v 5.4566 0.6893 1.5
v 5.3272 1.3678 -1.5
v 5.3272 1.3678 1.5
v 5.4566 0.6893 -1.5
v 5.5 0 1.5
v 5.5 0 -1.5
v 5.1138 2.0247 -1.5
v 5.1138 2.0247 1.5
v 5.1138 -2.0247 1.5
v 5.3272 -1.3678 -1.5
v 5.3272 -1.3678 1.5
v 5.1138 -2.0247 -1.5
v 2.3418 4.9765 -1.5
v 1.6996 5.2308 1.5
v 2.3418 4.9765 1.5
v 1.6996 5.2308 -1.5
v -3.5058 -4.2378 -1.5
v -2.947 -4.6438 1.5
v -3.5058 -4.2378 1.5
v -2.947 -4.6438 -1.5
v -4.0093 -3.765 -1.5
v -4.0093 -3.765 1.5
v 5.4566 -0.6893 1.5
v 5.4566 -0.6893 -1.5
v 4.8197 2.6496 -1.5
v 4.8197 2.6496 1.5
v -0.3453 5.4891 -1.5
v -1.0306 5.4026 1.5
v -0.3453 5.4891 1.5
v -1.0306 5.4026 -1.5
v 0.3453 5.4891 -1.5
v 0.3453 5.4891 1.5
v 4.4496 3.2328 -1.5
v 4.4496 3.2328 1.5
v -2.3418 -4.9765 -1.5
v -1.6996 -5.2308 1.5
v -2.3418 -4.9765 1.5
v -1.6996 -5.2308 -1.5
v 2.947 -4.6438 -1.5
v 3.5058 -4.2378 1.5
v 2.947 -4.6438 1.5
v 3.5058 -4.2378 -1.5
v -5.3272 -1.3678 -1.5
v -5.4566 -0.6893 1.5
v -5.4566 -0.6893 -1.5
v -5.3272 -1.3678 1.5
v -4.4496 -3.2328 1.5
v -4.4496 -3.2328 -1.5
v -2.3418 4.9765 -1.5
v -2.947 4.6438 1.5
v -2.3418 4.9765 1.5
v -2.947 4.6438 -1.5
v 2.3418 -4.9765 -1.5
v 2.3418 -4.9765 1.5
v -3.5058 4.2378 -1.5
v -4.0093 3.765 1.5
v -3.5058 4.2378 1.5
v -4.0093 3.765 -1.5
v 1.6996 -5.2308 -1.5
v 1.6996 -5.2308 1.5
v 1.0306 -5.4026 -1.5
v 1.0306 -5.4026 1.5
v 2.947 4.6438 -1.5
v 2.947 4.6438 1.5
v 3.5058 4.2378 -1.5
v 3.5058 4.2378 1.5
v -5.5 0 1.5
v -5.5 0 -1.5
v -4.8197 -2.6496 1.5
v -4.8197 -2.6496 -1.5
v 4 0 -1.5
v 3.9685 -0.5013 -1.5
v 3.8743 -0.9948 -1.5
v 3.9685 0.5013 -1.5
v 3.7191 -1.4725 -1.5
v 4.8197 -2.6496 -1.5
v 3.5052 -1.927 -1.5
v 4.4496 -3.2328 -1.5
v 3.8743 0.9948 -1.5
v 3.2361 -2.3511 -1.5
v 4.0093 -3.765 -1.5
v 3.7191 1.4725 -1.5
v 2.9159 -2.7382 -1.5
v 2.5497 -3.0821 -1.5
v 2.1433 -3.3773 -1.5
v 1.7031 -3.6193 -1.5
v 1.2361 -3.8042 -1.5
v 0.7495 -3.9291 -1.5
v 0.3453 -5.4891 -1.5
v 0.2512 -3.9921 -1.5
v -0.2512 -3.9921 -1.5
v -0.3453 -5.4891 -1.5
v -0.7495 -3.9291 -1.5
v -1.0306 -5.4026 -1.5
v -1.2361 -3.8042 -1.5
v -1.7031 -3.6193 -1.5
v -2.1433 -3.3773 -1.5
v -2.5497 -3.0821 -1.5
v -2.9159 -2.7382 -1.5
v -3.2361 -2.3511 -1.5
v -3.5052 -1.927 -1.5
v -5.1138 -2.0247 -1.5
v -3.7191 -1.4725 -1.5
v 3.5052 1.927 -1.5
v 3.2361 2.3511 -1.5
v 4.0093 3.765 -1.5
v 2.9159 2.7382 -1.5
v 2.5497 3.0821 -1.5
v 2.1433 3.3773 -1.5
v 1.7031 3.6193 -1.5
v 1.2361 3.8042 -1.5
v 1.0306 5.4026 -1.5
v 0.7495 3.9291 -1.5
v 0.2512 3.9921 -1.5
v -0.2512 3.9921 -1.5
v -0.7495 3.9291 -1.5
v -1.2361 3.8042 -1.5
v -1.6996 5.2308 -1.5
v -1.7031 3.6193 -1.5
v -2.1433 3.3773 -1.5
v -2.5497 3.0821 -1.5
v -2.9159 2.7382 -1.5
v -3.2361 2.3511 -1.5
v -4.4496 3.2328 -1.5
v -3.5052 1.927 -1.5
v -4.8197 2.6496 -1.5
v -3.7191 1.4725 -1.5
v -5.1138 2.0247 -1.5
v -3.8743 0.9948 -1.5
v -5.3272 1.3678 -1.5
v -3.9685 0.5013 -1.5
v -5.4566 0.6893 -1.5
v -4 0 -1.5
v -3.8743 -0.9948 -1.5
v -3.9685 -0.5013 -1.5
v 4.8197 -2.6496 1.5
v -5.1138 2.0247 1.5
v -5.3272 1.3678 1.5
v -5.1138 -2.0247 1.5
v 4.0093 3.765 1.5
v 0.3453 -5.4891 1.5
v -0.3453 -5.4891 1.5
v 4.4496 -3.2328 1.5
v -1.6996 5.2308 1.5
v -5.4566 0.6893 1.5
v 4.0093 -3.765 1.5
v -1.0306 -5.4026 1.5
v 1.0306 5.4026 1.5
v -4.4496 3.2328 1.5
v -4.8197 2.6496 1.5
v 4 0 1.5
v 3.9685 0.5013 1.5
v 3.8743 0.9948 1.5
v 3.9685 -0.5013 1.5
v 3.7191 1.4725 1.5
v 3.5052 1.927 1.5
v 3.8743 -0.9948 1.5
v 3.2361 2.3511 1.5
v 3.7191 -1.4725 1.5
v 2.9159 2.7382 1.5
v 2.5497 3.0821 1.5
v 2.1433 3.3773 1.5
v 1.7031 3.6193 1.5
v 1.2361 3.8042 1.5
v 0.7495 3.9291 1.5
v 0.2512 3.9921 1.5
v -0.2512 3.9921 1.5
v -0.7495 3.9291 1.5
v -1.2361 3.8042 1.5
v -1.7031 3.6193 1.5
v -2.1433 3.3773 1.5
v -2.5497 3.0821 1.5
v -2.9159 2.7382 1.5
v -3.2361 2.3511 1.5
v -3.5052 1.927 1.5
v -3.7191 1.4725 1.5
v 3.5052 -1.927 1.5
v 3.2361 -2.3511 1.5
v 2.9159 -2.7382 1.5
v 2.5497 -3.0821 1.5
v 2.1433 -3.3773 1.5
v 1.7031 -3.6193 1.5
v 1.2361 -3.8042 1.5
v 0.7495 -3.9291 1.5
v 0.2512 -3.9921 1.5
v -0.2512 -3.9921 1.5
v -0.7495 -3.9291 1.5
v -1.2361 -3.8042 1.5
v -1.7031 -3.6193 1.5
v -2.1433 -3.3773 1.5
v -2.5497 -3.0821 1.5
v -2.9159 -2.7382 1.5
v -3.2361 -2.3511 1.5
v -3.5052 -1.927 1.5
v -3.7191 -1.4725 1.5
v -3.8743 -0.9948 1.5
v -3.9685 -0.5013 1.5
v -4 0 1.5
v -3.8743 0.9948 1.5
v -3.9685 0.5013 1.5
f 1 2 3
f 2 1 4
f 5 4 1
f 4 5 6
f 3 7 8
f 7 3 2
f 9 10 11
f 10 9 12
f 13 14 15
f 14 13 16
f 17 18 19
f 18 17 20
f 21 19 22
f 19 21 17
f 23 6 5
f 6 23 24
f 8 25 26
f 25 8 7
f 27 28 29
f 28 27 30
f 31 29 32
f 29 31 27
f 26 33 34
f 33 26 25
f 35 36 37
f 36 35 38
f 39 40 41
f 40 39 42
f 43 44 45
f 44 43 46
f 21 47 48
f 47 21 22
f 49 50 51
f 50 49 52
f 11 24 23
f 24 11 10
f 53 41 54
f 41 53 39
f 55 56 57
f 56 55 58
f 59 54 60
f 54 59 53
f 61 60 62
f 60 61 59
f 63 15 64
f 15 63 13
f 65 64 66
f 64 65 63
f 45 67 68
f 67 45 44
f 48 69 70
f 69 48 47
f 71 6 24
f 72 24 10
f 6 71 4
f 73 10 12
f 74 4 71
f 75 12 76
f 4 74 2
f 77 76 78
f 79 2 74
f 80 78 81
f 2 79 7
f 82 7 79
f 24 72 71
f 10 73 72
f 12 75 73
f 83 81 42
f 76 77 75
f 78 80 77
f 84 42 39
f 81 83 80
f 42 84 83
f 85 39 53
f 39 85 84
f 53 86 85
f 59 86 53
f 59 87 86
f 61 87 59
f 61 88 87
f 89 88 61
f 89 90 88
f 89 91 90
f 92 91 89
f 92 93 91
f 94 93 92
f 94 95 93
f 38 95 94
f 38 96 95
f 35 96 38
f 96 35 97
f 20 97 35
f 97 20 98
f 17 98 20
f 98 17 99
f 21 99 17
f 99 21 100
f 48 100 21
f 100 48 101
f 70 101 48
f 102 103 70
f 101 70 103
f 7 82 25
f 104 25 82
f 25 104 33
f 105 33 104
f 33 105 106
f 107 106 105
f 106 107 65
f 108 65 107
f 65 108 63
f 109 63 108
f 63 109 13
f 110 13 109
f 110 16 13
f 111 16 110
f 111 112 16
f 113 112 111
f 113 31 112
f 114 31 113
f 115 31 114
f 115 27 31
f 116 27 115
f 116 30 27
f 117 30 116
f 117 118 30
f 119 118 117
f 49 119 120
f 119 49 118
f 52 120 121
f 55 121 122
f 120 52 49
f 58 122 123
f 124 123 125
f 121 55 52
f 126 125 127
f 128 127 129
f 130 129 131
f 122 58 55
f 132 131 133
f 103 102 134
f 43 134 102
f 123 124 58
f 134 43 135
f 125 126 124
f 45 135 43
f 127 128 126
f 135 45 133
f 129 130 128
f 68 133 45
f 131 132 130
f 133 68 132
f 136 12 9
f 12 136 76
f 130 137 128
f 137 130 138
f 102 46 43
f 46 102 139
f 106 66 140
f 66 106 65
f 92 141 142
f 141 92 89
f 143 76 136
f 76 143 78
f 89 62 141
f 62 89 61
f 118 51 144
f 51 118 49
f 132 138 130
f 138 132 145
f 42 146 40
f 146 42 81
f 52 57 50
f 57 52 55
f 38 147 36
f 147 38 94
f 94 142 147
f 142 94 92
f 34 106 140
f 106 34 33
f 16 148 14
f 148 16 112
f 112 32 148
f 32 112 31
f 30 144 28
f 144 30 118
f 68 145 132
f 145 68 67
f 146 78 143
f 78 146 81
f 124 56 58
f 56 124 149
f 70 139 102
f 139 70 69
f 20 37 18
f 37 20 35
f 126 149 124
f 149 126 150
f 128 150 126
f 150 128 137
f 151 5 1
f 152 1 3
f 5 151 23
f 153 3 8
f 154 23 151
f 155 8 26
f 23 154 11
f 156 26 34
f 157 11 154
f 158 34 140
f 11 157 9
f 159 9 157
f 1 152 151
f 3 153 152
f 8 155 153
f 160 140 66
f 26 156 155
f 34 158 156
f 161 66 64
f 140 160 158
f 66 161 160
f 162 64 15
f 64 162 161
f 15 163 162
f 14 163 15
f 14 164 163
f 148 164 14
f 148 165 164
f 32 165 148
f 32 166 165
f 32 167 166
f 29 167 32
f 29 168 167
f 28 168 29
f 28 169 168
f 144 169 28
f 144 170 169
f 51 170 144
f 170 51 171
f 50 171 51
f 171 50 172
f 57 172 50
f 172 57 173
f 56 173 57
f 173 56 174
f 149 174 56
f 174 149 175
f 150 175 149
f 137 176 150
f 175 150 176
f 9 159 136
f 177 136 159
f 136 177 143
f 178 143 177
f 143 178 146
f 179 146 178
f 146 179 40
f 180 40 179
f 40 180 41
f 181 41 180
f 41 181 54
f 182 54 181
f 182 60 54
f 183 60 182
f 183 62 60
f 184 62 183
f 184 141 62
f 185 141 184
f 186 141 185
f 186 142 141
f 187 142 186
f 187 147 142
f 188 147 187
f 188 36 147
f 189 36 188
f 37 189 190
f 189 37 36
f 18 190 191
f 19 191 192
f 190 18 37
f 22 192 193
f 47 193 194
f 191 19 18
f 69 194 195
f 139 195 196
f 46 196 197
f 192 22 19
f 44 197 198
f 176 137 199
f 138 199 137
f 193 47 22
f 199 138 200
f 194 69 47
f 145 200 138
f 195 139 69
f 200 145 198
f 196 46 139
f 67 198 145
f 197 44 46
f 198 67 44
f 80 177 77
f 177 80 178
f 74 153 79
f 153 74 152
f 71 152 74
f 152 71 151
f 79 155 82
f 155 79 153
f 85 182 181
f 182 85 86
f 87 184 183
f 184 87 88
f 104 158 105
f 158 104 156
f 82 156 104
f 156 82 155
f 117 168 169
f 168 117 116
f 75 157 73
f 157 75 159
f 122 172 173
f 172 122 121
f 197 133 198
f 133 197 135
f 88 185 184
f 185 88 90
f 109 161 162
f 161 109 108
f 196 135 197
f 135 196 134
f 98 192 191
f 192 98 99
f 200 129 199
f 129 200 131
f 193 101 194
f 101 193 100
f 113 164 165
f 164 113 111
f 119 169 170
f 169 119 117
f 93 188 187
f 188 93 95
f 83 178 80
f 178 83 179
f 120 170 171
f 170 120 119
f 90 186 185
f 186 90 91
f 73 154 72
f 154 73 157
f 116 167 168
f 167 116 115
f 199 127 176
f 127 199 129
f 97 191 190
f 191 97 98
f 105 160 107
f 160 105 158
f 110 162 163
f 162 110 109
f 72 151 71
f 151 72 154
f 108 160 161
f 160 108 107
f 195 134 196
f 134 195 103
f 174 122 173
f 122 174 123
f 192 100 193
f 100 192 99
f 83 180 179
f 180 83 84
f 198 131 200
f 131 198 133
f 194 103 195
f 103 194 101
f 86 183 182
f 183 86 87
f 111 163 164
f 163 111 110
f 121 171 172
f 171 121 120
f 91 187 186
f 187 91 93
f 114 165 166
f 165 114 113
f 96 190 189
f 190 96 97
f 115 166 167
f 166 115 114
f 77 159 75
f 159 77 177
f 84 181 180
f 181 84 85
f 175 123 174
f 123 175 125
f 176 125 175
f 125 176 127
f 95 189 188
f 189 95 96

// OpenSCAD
$fn = 50;


difference() {
	union() {
		translate(v = [0, 0, -1.5000000000]) {
			cylinder(h = 3, r = 5.5000000000);
		}
	}
	union() {
		translate(v = [0, 0, -100.0000000000]) {
			cylinder(h = 200, r = 4.0000000000);
		}
	}
}
